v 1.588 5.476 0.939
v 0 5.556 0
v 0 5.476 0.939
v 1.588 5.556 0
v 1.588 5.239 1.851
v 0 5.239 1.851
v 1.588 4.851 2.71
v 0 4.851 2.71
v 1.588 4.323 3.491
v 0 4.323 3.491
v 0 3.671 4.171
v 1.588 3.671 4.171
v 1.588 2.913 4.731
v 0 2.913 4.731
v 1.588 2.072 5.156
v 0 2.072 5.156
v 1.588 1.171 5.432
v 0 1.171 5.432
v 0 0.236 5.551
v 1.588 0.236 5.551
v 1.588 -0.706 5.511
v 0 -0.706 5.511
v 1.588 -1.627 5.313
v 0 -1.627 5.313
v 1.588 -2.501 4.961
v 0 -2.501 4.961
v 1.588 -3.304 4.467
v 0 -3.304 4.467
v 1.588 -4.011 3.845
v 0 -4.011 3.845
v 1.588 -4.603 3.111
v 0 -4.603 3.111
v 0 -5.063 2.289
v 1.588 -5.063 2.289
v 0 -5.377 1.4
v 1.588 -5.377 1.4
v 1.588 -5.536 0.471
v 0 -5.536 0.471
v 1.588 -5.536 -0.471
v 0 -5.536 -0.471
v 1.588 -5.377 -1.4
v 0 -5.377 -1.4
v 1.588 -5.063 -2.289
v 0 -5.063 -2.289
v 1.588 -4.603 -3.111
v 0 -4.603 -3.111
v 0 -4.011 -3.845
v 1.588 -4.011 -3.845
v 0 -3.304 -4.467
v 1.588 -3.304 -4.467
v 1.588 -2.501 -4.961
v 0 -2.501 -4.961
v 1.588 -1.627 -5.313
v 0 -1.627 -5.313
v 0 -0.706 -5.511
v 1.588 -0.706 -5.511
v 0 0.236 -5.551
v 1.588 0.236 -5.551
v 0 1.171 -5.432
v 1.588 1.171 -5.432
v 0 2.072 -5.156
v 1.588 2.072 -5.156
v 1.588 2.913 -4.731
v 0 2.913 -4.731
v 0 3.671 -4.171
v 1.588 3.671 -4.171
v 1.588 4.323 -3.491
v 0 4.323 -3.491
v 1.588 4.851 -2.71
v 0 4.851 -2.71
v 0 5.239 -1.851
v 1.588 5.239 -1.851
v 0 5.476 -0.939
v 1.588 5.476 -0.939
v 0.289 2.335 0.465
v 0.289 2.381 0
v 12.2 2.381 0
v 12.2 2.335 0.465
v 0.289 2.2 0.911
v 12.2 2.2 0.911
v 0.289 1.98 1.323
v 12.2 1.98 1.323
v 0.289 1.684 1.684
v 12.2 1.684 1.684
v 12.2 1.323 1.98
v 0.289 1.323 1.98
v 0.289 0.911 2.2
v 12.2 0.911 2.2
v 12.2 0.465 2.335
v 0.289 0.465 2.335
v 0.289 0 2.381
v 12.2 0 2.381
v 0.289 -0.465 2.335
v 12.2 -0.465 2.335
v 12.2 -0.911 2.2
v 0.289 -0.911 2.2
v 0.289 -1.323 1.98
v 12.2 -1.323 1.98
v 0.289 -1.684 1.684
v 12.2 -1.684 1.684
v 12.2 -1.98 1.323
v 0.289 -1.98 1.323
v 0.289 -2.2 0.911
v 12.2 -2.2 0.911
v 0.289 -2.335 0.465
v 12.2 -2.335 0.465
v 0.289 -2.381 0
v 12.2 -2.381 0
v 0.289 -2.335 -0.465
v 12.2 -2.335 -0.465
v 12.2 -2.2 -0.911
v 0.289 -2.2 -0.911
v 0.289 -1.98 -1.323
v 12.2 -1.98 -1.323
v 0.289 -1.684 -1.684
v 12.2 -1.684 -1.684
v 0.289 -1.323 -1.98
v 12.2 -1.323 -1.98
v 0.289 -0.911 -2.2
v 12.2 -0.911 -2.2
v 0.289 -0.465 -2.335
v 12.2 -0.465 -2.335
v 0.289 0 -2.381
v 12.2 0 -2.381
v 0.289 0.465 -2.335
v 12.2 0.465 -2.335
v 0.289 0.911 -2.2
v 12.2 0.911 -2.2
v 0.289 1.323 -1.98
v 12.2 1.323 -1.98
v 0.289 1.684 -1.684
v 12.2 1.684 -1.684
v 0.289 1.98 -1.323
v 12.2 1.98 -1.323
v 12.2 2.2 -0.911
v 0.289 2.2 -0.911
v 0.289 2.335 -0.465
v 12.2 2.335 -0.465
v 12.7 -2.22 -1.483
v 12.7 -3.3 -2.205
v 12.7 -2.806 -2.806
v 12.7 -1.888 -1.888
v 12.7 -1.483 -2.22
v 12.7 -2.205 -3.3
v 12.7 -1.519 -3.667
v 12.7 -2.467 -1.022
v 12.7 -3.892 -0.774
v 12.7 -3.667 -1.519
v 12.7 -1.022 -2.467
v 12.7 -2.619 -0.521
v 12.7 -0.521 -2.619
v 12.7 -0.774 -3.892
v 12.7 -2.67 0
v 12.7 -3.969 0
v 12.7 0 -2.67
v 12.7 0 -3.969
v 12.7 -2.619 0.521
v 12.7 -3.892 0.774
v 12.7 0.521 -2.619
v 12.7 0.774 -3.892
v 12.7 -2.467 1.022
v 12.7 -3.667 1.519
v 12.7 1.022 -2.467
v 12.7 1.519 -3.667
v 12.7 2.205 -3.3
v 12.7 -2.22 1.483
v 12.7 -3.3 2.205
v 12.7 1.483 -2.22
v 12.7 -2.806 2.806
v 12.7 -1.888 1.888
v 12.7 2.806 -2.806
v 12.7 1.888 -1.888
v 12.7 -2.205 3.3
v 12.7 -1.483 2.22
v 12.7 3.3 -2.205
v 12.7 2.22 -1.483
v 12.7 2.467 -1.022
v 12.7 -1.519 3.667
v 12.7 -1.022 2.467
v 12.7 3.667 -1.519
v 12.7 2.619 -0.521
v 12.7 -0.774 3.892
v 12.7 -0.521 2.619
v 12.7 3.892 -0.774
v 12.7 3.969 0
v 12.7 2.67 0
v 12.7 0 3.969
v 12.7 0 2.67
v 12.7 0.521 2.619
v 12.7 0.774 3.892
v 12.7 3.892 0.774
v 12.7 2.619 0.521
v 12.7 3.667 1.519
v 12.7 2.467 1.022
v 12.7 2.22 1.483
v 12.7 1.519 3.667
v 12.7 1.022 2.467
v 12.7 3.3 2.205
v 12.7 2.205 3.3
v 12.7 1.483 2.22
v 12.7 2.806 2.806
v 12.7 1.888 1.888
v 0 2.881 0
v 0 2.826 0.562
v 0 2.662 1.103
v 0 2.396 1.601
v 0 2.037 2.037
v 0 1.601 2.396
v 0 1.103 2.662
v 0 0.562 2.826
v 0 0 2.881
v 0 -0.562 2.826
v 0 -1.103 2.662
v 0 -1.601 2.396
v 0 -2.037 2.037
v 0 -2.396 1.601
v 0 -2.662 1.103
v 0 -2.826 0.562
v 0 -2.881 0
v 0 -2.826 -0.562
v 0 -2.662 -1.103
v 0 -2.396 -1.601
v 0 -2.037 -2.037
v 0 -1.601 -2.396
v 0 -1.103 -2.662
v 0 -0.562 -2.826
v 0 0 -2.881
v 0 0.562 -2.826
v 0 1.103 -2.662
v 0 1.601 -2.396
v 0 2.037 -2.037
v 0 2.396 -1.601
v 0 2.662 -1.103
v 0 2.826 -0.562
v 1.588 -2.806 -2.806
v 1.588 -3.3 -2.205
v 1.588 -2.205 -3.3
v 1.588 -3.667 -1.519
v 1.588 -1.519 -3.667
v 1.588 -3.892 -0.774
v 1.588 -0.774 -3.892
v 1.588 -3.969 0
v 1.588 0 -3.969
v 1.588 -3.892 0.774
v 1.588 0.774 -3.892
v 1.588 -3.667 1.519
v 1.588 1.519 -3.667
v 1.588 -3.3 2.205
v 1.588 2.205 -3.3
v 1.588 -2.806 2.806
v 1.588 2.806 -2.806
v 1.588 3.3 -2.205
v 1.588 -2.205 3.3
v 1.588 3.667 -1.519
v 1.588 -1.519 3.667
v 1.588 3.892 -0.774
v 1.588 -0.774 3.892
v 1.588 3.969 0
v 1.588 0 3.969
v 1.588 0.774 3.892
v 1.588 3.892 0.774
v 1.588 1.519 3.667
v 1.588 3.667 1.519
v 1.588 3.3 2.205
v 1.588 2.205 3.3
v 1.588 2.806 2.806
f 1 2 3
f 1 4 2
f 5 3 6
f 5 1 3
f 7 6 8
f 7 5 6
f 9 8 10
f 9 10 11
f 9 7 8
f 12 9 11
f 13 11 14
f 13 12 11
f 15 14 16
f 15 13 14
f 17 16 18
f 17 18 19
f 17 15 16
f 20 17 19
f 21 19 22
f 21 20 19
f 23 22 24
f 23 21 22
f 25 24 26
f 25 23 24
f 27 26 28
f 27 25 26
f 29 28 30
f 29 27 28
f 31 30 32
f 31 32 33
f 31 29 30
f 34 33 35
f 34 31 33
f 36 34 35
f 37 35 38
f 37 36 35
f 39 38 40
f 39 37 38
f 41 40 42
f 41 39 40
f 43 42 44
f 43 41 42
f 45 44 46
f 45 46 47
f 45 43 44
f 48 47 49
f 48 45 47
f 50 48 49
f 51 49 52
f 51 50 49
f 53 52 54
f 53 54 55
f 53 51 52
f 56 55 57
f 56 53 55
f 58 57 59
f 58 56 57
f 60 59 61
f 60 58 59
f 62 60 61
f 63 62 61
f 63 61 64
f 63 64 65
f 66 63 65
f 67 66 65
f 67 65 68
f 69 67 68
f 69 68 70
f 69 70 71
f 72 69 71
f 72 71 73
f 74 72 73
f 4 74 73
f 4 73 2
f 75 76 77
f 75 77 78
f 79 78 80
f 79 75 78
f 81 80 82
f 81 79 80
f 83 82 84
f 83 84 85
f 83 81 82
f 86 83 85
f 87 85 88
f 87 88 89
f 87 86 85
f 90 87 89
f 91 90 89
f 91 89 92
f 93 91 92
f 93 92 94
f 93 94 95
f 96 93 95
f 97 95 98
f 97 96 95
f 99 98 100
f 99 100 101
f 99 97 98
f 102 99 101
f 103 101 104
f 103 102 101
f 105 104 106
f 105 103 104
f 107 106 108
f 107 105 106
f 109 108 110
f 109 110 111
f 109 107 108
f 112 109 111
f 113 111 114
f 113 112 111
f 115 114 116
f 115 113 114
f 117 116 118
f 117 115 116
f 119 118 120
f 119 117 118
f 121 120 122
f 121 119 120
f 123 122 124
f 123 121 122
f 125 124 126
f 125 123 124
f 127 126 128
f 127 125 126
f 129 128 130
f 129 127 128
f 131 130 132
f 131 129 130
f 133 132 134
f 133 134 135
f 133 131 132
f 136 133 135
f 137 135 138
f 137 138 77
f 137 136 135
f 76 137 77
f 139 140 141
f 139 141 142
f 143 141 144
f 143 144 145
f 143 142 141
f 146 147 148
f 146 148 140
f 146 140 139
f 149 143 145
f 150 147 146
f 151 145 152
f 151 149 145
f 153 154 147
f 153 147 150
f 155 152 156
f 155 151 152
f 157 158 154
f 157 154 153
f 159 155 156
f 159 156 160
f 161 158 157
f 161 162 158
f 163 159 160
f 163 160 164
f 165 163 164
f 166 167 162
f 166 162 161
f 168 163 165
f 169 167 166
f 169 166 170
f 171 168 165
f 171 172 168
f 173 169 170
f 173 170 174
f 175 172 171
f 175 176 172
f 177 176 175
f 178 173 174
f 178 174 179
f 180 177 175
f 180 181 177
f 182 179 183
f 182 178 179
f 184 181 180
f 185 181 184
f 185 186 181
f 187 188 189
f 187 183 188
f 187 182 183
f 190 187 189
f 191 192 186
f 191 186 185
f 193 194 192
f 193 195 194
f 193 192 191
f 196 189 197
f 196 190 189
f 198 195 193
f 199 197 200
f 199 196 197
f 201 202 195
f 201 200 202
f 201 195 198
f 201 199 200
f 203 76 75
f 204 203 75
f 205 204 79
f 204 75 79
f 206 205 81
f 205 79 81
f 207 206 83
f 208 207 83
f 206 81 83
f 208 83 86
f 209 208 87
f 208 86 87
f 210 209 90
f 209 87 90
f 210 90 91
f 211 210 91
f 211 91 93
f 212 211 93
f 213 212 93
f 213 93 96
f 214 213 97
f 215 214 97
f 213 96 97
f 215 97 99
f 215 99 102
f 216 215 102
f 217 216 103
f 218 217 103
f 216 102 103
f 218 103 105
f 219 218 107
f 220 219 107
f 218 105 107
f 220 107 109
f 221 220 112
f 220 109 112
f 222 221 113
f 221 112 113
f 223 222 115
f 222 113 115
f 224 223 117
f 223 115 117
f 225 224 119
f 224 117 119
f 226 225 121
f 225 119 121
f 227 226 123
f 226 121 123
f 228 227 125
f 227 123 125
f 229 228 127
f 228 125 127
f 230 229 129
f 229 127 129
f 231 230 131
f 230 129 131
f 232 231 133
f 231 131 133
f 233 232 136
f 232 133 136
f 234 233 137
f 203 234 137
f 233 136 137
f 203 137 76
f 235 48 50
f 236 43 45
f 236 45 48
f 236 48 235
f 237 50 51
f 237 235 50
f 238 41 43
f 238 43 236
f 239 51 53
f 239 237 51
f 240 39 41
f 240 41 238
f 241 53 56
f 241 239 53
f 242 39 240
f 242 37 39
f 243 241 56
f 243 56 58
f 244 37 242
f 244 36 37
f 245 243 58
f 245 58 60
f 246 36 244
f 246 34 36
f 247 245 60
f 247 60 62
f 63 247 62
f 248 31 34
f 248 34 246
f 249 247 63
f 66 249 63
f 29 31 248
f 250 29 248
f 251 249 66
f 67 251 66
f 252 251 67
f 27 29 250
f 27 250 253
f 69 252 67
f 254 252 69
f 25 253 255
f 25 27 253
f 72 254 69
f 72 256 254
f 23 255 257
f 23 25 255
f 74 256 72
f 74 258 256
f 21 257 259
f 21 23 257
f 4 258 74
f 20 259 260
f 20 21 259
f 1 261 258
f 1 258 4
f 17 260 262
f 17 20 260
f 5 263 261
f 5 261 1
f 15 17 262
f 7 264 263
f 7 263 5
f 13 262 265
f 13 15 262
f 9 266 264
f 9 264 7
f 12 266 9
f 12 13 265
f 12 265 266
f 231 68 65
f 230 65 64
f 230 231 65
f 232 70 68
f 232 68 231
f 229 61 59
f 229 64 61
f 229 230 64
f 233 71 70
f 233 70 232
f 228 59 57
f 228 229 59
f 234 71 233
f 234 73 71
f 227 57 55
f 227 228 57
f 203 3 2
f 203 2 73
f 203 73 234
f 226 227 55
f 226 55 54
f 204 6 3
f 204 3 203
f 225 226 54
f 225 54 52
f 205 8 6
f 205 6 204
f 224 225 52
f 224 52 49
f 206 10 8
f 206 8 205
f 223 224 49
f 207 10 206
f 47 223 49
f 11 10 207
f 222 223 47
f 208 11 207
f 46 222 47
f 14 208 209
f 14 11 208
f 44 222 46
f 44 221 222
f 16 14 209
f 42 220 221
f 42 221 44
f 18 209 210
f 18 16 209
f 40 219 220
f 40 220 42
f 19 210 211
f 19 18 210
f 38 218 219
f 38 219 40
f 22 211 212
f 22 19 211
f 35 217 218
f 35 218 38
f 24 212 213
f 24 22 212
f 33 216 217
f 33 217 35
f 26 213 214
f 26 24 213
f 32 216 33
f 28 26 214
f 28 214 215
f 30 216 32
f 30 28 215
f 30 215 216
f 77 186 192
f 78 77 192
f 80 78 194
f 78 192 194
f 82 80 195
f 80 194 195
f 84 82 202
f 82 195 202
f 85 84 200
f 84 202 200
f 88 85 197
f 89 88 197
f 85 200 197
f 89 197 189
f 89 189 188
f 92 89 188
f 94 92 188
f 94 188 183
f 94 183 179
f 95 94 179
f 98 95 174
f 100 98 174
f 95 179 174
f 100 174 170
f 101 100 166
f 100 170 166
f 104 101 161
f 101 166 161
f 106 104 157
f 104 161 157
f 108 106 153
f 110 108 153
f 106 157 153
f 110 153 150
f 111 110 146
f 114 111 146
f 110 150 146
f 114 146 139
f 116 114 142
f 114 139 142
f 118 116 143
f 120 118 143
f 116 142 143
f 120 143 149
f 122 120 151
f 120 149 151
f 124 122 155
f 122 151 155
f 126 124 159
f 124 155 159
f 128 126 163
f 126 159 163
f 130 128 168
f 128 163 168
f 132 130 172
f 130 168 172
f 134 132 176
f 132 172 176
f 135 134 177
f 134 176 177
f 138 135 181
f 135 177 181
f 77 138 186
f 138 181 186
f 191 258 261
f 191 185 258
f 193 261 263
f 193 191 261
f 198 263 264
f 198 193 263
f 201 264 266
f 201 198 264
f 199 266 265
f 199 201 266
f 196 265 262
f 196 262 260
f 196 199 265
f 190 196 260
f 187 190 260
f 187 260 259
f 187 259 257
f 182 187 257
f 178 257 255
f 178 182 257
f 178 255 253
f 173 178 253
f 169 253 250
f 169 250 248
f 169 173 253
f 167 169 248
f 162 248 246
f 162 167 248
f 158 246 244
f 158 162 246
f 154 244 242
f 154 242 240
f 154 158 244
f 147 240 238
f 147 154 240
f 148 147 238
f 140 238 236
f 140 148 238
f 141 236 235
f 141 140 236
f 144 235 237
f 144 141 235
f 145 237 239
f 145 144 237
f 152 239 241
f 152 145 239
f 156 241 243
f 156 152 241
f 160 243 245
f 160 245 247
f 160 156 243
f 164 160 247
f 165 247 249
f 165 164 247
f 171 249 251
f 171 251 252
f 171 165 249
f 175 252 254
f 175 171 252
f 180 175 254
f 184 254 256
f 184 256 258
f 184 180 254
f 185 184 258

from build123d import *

# Parameters (mm, degrees)
CHAMFER1_SIZE         = 0.5
CHAMFER1_SIZE2        = 0.288675135
CHAMFER1_PART_2_SIZE  = 0.5
CHAMFER1_PART_2_SIZE2 = 0.288675135


with BuildPart() as part:
    # Sketch1 → Revolve1 (revolve)
    with BuildSketch(Plane.XY):
        Polygon((0, 2.38125), (0, 5.55625), (1.5875, 5.55625), (1.5875, 3.96875), (12.7, 3.96875), (12.7, 2.38125), align=None)
    revolve(axis=Axis((0, 0, 0), (1, 0, 0)))

    # Chamfer1
    chamfer1_edges = [part.edges().sort_by_distance(p)[0] for p in [
        (12.7, -2.38125, 0),
    ]]
    chamfer1_side = [part.faces().sort_by_distance(p)[0] for p in [
        (6.35, -2.38125, 0),
    ]]
    chamfer(chamfer1_edges, length=CHAMFER1_SIZE, length2=CHAMFER1_SIZE2, reference=chamfer1_side[0])

    # Chamfer1 part 2
    chamfer1_part_2_edges = [part.edges().sort_by_distance(p)[0] for p in [
        (0, -2.38125, 0),
    ]]
    chamfer1_part_2_side = [part.faces().sort_by_distance(p)[0] for p in [
        (0, -2.538404482, 0),
    ]]
    chamfer(chamfer1_part_2_edges, length=CHAMFER1_PART_2_SIZE, length2=CHAMFER1_PART_2_SIZE2, reference=chamfer1_part_2_side[0])


solid = part.part
